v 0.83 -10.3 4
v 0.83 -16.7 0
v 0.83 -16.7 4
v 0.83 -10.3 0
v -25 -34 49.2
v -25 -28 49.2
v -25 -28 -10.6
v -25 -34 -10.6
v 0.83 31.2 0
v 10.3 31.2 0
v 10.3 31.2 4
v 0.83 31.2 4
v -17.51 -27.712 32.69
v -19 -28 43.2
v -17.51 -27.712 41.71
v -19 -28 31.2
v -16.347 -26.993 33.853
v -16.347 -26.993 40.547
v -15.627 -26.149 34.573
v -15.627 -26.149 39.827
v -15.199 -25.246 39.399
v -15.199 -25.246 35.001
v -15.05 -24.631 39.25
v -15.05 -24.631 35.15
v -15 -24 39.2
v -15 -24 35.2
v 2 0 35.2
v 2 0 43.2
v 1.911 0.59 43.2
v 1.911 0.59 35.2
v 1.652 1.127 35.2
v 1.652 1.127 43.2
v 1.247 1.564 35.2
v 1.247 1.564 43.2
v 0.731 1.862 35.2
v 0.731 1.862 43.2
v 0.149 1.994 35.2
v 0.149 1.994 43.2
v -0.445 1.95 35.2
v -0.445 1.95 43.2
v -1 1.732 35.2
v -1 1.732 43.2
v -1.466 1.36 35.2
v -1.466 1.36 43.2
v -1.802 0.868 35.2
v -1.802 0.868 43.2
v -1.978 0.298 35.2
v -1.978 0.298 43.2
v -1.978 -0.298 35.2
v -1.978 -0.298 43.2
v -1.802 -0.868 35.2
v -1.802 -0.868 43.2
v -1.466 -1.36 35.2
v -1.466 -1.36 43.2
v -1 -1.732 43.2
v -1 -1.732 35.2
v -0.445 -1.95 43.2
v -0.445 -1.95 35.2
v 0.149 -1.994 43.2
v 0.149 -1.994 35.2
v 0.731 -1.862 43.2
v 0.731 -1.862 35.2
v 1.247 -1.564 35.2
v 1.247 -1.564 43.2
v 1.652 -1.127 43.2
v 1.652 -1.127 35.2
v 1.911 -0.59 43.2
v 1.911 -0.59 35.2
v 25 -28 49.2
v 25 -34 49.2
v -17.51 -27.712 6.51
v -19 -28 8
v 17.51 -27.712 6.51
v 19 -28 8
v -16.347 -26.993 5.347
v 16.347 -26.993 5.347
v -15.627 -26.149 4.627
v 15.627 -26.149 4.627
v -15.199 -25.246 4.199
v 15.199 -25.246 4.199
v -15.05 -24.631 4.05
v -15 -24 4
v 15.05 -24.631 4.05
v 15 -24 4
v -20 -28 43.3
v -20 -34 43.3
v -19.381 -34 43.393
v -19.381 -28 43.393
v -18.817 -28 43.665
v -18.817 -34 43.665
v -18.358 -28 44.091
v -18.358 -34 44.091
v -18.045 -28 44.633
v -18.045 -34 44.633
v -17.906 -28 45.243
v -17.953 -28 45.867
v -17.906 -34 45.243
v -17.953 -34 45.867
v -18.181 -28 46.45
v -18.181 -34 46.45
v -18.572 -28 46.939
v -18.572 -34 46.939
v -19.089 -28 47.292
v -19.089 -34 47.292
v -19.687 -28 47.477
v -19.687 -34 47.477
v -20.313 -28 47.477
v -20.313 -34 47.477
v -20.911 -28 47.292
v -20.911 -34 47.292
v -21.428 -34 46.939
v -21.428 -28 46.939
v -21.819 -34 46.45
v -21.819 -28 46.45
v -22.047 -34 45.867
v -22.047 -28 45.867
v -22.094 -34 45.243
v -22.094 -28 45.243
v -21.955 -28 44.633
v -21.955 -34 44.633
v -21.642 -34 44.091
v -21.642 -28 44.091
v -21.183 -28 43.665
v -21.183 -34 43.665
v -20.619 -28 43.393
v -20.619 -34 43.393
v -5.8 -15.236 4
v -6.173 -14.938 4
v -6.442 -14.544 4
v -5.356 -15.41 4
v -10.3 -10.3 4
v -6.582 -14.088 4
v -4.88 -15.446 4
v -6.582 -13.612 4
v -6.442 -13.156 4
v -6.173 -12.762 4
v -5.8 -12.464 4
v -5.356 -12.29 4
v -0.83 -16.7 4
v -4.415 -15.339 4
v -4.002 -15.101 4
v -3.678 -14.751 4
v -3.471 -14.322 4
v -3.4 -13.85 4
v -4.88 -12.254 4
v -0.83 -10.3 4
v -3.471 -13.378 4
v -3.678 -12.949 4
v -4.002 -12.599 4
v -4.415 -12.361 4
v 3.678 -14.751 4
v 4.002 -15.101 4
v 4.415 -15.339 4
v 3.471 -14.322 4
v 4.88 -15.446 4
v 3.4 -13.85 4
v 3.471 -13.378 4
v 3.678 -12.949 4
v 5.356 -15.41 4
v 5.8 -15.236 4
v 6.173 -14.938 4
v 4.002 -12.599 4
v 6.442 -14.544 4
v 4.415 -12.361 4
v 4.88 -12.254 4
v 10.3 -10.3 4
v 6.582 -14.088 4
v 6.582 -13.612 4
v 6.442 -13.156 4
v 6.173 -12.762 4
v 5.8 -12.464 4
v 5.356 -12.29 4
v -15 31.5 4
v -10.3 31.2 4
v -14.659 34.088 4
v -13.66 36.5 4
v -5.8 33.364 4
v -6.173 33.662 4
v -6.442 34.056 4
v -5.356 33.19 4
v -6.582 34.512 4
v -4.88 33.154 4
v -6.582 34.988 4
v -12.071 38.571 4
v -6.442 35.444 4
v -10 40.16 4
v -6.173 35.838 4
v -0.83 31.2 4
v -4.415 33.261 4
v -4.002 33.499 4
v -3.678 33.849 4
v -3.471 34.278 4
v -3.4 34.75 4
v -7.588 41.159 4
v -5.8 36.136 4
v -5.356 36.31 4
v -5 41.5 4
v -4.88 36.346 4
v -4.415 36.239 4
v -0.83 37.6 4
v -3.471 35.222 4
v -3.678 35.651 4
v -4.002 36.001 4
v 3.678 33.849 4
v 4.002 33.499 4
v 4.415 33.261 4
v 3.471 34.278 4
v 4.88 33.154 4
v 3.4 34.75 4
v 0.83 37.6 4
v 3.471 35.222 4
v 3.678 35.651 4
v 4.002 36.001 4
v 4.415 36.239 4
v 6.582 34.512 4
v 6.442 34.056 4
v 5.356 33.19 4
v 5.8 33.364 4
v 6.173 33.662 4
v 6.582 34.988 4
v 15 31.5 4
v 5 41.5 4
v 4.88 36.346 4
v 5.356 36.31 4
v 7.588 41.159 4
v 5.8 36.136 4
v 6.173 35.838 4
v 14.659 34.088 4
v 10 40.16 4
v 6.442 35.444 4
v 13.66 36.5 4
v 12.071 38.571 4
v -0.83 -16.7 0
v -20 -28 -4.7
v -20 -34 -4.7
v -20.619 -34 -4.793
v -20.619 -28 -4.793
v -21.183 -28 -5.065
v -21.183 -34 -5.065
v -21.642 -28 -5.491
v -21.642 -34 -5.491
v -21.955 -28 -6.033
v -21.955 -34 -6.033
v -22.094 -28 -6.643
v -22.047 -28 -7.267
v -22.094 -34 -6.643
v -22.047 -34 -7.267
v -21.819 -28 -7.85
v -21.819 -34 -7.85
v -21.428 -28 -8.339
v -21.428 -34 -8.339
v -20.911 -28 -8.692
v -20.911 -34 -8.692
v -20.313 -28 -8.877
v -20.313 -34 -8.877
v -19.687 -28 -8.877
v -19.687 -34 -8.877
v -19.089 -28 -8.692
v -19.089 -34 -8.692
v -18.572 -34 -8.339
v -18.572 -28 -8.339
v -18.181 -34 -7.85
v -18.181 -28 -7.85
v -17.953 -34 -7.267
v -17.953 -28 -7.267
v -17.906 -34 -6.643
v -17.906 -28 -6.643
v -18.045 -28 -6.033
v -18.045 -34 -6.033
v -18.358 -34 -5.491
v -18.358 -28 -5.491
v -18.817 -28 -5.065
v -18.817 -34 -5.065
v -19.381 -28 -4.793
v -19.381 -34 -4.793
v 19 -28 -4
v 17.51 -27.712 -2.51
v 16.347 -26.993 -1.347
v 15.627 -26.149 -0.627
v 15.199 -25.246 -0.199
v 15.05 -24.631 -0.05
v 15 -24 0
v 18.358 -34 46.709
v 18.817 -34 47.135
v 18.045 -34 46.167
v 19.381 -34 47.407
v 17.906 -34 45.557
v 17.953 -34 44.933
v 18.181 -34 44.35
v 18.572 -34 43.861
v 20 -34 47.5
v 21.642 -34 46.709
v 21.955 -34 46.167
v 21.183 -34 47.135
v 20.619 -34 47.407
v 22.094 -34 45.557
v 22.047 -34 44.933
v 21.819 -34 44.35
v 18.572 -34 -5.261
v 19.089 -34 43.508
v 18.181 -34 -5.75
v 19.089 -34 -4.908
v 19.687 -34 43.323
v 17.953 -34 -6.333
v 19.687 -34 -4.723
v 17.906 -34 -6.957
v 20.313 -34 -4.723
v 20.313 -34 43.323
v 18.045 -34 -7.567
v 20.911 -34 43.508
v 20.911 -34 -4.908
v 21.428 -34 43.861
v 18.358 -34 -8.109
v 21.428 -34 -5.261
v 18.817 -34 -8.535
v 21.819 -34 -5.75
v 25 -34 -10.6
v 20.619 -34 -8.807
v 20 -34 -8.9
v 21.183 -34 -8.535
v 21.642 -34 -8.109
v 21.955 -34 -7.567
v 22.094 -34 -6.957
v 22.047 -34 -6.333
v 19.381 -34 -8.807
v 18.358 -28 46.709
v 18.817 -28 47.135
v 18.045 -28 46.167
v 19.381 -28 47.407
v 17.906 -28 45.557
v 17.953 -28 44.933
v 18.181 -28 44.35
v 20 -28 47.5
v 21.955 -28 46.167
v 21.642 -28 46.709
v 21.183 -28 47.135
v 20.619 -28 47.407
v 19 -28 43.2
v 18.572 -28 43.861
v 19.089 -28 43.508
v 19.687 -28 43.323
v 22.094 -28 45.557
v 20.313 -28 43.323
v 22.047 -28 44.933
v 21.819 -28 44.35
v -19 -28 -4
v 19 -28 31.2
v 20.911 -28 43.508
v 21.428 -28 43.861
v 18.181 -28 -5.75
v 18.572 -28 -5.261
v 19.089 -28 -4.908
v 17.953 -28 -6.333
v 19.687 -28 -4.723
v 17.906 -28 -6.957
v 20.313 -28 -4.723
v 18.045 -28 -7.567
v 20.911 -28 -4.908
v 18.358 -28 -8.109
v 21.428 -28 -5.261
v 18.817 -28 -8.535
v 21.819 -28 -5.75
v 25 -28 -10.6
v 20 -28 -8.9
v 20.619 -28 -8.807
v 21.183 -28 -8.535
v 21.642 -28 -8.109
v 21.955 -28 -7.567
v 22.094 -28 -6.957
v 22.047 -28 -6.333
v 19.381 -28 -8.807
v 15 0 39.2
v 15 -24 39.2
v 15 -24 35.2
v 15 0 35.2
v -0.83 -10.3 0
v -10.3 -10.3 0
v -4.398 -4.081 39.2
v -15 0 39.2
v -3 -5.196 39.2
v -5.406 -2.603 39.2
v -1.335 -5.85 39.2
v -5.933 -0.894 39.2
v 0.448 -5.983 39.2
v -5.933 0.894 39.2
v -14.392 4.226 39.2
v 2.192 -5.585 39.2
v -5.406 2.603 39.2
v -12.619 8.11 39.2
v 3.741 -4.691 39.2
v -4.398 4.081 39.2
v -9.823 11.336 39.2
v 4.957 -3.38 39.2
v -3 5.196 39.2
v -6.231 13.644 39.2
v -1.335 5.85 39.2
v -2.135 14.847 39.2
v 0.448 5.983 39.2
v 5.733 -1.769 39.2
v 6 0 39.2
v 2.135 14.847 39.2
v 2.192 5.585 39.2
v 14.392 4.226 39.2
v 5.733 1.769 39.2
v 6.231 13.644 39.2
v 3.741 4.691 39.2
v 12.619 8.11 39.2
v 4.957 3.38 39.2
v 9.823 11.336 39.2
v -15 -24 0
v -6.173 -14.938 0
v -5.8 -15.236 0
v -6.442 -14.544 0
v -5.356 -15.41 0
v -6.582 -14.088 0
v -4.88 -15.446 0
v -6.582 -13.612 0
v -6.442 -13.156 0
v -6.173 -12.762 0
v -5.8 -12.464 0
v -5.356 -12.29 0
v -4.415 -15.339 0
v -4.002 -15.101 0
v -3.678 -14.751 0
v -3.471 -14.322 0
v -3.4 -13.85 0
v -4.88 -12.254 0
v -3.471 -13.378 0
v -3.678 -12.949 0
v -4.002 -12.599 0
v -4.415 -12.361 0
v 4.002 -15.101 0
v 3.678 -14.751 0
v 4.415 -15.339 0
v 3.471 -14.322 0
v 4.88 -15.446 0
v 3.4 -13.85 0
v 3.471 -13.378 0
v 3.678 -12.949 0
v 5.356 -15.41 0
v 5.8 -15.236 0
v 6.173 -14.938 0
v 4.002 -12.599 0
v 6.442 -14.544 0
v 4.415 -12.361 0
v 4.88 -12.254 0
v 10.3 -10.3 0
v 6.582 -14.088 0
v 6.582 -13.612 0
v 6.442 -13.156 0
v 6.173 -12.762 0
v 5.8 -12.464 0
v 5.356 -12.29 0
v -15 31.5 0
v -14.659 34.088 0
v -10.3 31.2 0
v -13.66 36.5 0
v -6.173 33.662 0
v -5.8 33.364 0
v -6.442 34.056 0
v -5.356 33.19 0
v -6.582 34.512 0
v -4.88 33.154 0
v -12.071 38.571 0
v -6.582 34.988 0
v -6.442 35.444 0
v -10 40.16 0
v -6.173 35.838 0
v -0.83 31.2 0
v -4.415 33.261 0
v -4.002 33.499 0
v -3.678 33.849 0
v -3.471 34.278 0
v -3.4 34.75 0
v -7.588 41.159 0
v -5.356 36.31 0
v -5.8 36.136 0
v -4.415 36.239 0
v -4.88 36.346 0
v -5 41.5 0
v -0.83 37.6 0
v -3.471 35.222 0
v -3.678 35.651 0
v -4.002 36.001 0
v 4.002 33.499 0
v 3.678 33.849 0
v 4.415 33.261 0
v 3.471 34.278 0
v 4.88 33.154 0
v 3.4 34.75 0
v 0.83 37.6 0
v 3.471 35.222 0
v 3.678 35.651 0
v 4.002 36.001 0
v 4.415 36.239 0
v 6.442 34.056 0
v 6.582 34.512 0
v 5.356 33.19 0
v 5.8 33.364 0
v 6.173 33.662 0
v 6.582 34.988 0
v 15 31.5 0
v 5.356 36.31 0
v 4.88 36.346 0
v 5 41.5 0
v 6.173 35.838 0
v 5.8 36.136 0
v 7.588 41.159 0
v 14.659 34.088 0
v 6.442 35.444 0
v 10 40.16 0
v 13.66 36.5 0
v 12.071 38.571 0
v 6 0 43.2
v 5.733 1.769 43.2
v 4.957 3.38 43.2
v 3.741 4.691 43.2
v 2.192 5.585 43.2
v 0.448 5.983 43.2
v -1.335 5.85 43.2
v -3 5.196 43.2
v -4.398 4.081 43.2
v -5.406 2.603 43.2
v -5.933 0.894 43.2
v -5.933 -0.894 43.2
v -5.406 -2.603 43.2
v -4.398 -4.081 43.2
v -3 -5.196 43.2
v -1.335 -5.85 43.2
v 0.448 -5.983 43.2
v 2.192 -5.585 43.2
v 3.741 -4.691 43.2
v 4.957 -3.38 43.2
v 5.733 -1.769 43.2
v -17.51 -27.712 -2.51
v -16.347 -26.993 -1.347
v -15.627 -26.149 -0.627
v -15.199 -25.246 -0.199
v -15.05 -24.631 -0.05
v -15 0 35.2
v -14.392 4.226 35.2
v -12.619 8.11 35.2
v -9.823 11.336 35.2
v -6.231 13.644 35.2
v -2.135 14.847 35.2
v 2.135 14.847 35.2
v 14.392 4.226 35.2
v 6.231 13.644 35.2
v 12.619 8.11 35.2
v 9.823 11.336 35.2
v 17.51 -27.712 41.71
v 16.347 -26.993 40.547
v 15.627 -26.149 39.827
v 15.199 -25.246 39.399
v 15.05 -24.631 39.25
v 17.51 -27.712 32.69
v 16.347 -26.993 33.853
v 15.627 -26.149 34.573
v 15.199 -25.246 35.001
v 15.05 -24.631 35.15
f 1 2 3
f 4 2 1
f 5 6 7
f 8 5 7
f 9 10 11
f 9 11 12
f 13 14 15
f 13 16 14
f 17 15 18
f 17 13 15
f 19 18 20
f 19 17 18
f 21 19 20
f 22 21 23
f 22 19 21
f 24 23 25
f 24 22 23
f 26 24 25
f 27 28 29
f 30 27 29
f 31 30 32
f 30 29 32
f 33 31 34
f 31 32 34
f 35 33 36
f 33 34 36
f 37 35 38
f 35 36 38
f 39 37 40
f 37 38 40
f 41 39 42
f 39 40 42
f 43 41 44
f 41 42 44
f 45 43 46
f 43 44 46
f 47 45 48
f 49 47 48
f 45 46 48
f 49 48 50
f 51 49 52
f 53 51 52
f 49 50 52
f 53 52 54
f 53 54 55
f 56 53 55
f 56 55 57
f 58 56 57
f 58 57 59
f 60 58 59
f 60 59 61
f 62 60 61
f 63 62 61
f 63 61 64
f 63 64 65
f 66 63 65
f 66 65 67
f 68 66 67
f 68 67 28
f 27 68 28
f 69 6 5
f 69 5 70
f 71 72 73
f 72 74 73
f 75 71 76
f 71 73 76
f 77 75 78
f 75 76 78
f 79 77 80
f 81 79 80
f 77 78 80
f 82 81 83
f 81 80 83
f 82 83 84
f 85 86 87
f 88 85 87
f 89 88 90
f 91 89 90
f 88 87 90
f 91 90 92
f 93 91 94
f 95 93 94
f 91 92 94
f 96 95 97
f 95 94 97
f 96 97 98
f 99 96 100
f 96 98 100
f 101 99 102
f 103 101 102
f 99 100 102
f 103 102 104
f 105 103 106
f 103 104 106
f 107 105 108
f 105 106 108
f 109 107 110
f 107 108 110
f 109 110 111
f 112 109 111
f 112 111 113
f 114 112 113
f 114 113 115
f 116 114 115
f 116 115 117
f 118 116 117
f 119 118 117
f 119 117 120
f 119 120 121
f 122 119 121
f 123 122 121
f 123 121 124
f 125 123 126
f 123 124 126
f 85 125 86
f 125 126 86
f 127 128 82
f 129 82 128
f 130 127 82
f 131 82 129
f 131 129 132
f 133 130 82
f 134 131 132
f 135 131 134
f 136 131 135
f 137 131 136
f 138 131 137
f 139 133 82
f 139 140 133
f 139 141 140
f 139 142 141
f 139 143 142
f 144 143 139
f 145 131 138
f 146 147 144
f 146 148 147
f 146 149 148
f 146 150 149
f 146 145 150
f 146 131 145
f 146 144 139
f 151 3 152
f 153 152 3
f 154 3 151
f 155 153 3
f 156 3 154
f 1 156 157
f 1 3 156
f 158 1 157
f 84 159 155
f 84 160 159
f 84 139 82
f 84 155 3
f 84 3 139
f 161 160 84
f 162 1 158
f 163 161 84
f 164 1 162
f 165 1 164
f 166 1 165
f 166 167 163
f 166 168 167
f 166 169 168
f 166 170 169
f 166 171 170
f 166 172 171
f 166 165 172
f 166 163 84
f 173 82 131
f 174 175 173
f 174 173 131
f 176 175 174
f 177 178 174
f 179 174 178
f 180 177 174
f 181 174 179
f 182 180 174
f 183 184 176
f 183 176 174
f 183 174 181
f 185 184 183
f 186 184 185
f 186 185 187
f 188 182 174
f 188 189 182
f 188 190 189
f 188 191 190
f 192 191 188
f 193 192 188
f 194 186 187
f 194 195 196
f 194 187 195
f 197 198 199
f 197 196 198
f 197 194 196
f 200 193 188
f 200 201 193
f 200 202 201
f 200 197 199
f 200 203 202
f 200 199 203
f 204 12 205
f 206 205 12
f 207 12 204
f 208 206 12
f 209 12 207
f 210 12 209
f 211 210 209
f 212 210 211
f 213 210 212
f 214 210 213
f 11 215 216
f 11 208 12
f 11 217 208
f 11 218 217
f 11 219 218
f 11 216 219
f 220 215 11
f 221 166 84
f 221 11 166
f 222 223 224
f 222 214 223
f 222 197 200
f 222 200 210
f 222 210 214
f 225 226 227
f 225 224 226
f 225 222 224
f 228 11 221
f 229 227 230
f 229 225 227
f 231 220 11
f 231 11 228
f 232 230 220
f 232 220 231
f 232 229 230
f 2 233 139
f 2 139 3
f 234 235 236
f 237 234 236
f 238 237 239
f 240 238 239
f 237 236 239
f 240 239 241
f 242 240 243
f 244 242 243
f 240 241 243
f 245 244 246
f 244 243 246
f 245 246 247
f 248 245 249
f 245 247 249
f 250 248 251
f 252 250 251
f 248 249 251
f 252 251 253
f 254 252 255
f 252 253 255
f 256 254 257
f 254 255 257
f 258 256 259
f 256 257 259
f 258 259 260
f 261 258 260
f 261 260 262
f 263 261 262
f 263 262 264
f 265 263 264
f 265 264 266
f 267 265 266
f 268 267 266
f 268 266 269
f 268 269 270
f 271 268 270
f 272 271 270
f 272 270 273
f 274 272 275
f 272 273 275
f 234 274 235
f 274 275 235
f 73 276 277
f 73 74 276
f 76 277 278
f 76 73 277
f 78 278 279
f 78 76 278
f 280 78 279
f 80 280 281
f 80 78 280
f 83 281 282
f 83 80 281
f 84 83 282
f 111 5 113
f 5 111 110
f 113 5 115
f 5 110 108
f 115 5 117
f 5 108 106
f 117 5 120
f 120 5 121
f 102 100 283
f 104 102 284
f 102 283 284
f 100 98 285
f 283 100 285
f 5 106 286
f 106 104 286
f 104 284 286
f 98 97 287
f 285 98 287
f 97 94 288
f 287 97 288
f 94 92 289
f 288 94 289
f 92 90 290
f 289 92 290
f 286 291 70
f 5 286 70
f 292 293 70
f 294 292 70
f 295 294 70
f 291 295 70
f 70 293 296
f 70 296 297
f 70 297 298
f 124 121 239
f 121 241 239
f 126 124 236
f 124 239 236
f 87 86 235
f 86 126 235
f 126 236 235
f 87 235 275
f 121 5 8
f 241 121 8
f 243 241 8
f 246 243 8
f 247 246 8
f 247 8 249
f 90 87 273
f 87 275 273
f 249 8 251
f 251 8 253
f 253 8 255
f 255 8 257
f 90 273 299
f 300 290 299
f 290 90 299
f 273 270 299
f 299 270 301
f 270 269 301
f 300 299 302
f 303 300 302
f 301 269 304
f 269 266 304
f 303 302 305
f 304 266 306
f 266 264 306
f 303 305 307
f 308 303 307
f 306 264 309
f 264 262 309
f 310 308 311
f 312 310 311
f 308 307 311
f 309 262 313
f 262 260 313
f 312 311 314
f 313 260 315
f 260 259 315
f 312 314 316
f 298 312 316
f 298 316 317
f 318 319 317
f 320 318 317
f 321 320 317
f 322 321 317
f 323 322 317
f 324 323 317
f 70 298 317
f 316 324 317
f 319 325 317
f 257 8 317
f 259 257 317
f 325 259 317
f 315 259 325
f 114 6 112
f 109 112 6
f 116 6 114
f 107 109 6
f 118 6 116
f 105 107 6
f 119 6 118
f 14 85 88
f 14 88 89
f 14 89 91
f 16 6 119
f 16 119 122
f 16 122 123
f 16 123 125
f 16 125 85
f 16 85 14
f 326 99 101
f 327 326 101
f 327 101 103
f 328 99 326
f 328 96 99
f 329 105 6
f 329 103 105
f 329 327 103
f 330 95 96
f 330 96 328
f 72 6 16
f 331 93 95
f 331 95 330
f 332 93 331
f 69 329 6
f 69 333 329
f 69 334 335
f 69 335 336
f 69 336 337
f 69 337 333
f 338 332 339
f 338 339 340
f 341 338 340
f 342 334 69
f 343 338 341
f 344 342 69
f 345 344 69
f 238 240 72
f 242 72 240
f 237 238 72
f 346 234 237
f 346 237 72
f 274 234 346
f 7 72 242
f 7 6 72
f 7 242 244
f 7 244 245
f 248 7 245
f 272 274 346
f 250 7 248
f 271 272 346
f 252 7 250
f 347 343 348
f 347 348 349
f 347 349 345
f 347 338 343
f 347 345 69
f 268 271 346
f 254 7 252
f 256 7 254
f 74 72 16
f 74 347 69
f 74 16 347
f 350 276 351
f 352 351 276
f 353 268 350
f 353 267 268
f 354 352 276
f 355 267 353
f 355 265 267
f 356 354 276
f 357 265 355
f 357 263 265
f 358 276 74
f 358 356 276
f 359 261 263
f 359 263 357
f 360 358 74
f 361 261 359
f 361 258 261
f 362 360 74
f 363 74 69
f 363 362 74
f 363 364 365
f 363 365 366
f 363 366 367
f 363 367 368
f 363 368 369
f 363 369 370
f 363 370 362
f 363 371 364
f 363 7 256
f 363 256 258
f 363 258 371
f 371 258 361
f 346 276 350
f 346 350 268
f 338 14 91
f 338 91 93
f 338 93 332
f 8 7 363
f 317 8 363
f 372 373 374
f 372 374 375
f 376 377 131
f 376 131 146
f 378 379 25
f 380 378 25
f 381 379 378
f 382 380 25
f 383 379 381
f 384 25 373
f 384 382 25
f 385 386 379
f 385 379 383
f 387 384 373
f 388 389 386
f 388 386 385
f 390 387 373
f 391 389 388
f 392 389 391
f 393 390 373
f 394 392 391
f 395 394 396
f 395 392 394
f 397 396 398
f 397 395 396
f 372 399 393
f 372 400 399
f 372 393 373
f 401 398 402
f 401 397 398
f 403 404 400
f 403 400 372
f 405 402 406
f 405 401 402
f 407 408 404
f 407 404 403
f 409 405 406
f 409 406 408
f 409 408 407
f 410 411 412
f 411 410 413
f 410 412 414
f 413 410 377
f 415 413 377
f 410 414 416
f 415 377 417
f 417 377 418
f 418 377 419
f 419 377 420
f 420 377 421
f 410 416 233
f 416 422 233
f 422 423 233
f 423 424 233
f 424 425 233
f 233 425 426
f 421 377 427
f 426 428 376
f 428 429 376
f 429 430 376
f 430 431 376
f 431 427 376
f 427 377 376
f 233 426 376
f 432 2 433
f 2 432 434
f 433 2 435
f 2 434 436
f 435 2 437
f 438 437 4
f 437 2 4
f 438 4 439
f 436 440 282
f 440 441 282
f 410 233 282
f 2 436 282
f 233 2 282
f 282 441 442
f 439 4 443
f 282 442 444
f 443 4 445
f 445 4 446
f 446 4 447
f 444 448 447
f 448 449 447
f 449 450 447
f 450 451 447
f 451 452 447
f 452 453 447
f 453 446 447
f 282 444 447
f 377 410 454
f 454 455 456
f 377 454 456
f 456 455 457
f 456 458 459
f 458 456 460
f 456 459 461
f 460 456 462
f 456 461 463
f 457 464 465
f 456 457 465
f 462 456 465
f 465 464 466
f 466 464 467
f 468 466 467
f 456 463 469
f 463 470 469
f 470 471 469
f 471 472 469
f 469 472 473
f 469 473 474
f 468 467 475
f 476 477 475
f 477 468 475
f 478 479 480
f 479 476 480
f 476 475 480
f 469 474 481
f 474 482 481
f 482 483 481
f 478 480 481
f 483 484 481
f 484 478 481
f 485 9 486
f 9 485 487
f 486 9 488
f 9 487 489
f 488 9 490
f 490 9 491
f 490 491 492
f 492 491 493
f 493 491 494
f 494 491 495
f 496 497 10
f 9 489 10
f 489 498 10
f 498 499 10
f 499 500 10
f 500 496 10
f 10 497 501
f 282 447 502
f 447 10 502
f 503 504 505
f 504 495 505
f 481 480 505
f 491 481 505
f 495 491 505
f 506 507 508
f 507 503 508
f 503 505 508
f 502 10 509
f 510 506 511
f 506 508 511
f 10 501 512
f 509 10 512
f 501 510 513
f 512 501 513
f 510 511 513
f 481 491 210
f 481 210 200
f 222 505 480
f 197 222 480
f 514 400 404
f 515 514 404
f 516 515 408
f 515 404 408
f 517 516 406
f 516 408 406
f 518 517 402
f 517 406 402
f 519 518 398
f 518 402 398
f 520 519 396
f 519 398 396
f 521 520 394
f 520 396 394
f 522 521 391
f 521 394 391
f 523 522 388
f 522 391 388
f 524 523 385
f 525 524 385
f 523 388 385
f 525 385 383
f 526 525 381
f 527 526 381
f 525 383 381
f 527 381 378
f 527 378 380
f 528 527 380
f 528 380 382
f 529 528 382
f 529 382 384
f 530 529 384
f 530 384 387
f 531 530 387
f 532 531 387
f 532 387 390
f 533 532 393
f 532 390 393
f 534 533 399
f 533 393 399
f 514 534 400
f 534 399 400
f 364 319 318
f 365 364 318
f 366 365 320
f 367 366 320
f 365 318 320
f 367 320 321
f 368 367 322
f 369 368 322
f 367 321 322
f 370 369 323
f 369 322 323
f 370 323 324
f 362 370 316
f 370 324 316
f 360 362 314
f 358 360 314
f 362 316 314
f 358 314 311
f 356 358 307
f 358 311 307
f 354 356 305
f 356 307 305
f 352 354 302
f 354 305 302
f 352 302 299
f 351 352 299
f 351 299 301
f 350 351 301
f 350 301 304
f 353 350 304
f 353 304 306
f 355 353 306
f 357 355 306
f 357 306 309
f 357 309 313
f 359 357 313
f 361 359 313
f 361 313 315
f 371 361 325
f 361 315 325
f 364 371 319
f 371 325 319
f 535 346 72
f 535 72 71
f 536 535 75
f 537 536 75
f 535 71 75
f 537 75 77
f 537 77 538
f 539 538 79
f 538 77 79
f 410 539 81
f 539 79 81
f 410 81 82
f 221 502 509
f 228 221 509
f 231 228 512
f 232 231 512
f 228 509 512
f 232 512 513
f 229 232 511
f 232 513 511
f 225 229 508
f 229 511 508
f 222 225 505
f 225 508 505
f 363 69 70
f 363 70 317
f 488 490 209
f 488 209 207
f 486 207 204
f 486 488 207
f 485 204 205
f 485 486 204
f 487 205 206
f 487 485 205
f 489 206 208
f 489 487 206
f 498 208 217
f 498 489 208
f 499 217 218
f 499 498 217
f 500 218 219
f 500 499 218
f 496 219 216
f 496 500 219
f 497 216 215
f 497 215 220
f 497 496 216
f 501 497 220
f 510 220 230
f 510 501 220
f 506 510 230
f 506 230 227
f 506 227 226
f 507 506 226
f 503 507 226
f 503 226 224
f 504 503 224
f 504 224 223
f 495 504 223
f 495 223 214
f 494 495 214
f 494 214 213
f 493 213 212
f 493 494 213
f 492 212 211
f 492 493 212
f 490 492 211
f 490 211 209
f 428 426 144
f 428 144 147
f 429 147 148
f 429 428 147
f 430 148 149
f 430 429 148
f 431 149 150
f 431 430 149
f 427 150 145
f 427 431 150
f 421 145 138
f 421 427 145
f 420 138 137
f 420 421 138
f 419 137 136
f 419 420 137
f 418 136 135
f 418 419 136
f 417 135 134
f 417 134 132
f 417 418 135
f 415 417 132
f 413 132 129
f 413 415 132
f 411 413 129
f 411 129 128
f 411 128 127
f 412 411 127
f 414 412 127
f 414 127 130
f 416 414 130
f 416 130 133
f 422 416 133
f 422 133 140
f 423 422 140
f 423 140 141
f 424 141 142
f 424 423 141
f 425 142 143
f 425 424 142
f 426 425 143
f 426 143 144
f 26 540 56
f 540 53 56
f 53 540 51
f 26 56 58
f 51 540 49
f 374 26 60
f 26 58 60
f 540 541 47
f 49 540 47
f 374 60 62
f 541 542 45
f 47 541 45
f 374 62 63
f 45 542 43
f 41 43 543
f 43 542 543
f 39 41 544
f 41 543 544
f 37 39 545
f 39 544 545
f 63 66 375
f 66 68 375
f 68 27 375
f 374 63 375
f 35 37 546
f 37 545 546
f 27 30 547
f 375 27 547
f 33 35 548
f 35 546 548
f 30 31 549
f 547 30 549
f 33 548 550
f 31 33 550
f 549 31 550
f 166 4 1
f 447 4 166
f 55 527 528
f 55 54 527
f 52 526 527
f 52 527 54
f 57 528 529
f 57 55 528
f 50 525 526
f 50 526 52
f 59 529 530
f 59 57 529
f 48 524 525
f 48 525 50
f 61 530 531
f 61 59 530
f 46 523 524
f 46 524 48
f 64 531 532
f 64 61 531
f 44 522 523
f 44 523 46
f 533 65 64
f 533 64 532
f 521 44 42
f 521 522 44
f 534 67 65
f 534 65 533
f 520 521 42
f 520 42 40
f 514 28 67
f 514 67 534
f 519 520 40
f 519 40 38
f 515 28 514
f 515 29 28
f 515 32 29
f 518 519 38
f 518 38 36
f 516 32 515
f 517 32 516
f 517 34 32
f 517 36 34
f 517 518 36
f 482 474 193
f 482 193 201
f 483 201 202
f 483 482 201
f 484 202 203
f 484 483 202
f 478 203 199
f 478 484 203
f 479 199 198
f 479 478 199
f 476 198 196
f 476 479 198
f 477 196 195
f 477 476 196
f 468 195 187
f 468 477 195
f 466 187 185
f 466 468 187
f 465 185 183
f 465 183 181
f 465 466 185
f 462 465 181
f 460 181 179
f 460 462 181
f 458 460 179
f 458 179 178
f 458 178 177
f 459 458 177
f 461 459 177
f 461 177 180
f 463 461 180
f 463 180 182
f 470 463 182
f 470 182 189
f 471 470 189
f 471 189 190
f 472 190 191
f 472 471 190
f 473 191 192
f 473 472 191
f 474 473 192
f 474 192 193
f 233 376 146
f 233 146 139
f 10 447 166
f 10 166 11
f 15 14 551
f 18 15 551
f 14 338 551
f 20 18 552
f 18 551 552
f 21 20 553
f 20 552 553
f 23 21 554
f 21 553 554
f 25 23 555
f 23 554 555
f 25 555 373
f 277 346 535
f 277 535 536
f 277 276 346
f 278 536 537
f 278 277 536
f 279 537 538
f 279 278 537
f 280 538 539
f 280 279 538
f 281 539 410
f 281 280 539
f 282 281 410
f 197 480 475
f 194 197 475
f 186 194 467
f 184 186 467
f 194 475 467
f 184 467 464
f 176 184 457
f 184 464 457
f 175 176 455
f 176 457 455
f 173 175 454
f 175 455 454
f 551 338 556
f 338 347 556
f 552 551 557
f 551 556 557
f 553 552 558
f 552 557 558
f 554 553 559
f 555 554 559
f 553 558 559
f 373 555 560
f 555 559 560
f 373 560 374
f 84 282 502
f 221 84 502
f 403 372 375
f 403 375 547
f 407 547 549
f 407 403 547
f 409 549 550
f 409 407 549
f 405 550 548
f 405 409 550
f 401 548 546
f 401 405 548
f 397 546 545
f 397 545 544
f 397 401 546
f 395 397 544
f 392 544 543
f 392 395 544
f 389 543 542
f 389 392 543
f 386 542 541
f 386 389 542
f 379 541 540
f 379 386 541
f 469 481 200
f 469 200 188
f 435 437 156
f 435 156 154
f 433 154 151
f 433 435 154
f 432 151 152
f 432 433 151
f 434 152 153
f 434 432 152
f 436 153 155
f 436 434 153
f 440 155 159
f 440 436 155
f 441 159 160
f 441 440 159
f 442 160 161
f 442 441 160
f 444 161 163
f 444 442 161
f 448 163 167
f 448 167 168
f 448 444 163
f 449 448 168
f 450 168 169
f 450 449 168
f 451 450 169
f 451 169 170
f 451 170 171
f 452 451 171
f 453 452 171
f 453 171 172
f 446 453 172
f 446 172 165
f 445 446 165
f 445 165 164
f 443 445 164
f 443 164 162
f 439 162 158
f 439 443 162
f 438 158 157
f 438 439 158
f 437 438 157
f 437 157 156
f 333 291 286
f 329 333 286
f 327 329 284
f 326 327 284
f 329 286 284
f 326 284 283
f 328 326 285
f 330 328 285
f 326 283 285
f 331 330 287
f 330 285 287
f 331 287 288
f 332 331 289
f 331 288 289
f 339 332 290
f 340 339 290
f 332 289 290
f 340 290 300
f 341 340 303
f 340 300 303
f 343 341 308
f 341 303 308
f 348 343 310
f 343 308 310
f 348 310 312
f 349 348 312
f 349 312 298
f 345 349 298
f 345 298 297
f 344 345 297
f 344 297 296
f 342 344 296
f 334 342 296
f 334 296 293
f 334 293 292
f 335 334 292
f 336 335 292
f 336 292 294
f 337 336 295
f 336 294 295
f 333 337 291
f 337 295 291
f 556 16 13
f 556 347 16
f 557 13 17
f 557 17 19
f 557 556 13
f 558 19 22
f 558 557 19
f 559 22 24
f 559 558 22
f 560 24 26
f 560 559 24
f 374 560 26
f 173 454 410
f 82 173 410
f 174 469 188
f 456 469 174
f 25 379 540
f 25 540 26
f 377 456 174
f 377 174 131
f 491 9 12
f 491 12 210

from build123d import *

# Parameters (mm, degrees)
SKETCH1_R           = 1.6
BOSS_EXTRUDE1_DEPTH = 4
BOSS_EXTRUDE2_DEPTH = 4
SKETCH3_R           = 6
BOSS_EXTRUDE3_DEPTH = 4
SKETCH4_R           = 2
CUT_EXTRUDE1_DEPTH  = 62.753461441
SKETCH5_W           = 50
SKETCH5_H           = 59.8
BOSS_EXTRUDE4_DEPTH = 6
SKETCH6_R           = 2.1
CUT_EXTRUDE2_DEPTH  = 6
FILLET1_R           = 4


with BuildPart() as part:
    # Sketch1 → Boss-Extrude1 (new body)
    with BuildSketch(Plane.XY):
        with BuildLine():
            Line((-15, -28), (15, -28))
            Line((15, -28), (15, 31.5))
            ThreePointArc((15, 31.5), (12.071067812, 38.571067812), (5, 41.5))
            Line((5, 41.5), (-5, 41.5))
            ThreePointArc((-5, 41.5), (-12.071067812, 38.571067812), (-15, 31.5))
            Line((-15, 31.5), (-15, -28))
        make_face()
        with Locations((-5, 34.75)):
            Circle(SKETCH1_R, mode=Mode.SUBTRACT)
        with Locations((-5, -13.85)):
            Circle(SKETCH1_R, mode=Mode.SUBTRACT)
        with Locations(Location((5, 34.75, 0), (0, 0, 180))):
            Circle(SKETCH1_R, mode=Mode.SUBTRACT)
        with Locations(Location((5, -13.85, 0), (0, 0, 180))):
            Circle(SKETCH1_R, mode=Mode.SUBTRACT)
        Polygon((-10.3, -10.3), (-0.83, -10.3), (-0.83, -16.7), (0.83, -16.7), (0.83, -10.3), (10.3, -10.3), (10.3, 31.2), (0.83, 31.2), (0.83, 37.6), (-0.83, 37.6), (-0.83, 31.2), (-10.3, 31.2), align=None, mode=Mode.SUBTRACT)
    extrude(amount=BOSS_EXTRUDE1_DEPTH)



with BuildPart() as body_2:
    # Sketch2 → Boss-Extrude2 (new body)
    with BuildSketch(Plane.XY.offset(39.2)):
        with BuildLine():
            Line((-15, -28), (15, -28))
            Line((15, -28), (15, 0))
            ThreePointArc((15, 0), (0, 15), (-15, 0))
            Line((-15, 0), (-15, -28))
        make_face()
    extrude(amount=-BOSS_EXTRUDE2_DEPTH)

    # Sketch3 → Boss-Extrude3 (add)
    with BuildSketch(Plane.XY.offset(39.2)):
        Circle(SKETCH3_R)
    extrude(amount=BOSS_EXTRUDE3_DEPTH)

    # Sketch4 → Cut-Extrude1 (cut, through all)
    with BuildSketch(Plane.XY.offset(43.2)):
        Circle(SKETCH4_R)
    extrude(amount=-CUT_EXTRUDE1_DEPTH, mode=Mode.SUBTRACT)


with BuildPart() as part_1:
    add(part.part)

    add(body_2.part)  # Boss-Extrude4 merges body 2
    # Sketch5 → Boss-Extrude4 (add)
    with BuildSketch(Plane(origin=(0, -28, 0), x_dir=(1, 0, 0), z_dir=(0, 1, 0))):
        with Locations((0, -19.3)):
            Rectangle(SKETCH5_W, SKETCH5_H)
    extrude(amount=-BOSS_EXTRUDE4_DEPTH)

    # Sketch6 → Cut-Extrude2 (cut)
    with BuildSketch(Plane.XZ.offset(34)):
        with Locations(Location((-20, 45.4, 0), (0, 0, 270))):
            Circle(SKETCH6_R)
        with Locations(Location((20, 45.4, 0), (0, 0, 90))):
            Circle(SKETCH6_R)
        with Locations(Location((20, -6.8, 0), (0, 0, 270))):
            Circle(SKETCH6_R)
        with Locations(Location((-20, -6.8, 0), (0, 0, 90))):
            Circle(SKETCH6_R)
    extrude(amount=-CUT_EXTRUDE2_DEPTH, mode=Mode.SUBTRACT)

    # Fillet1
    fillet1_edges = [part_1.edges().sort_by_distance(p)[0] for p in [
        (15, -28, 2),
        (-15, -28, 2),
        (0, -28, 0),
        (-15, -28, 37.2),
        (0, -28, 35.2),
        (15, -28, 37.2),
        (0, -28, 39.2),
        (0, -28, 4),
    ]]
    fillet(fillet1_edges, radius=FILLET1_R)


solid = part_1.part
